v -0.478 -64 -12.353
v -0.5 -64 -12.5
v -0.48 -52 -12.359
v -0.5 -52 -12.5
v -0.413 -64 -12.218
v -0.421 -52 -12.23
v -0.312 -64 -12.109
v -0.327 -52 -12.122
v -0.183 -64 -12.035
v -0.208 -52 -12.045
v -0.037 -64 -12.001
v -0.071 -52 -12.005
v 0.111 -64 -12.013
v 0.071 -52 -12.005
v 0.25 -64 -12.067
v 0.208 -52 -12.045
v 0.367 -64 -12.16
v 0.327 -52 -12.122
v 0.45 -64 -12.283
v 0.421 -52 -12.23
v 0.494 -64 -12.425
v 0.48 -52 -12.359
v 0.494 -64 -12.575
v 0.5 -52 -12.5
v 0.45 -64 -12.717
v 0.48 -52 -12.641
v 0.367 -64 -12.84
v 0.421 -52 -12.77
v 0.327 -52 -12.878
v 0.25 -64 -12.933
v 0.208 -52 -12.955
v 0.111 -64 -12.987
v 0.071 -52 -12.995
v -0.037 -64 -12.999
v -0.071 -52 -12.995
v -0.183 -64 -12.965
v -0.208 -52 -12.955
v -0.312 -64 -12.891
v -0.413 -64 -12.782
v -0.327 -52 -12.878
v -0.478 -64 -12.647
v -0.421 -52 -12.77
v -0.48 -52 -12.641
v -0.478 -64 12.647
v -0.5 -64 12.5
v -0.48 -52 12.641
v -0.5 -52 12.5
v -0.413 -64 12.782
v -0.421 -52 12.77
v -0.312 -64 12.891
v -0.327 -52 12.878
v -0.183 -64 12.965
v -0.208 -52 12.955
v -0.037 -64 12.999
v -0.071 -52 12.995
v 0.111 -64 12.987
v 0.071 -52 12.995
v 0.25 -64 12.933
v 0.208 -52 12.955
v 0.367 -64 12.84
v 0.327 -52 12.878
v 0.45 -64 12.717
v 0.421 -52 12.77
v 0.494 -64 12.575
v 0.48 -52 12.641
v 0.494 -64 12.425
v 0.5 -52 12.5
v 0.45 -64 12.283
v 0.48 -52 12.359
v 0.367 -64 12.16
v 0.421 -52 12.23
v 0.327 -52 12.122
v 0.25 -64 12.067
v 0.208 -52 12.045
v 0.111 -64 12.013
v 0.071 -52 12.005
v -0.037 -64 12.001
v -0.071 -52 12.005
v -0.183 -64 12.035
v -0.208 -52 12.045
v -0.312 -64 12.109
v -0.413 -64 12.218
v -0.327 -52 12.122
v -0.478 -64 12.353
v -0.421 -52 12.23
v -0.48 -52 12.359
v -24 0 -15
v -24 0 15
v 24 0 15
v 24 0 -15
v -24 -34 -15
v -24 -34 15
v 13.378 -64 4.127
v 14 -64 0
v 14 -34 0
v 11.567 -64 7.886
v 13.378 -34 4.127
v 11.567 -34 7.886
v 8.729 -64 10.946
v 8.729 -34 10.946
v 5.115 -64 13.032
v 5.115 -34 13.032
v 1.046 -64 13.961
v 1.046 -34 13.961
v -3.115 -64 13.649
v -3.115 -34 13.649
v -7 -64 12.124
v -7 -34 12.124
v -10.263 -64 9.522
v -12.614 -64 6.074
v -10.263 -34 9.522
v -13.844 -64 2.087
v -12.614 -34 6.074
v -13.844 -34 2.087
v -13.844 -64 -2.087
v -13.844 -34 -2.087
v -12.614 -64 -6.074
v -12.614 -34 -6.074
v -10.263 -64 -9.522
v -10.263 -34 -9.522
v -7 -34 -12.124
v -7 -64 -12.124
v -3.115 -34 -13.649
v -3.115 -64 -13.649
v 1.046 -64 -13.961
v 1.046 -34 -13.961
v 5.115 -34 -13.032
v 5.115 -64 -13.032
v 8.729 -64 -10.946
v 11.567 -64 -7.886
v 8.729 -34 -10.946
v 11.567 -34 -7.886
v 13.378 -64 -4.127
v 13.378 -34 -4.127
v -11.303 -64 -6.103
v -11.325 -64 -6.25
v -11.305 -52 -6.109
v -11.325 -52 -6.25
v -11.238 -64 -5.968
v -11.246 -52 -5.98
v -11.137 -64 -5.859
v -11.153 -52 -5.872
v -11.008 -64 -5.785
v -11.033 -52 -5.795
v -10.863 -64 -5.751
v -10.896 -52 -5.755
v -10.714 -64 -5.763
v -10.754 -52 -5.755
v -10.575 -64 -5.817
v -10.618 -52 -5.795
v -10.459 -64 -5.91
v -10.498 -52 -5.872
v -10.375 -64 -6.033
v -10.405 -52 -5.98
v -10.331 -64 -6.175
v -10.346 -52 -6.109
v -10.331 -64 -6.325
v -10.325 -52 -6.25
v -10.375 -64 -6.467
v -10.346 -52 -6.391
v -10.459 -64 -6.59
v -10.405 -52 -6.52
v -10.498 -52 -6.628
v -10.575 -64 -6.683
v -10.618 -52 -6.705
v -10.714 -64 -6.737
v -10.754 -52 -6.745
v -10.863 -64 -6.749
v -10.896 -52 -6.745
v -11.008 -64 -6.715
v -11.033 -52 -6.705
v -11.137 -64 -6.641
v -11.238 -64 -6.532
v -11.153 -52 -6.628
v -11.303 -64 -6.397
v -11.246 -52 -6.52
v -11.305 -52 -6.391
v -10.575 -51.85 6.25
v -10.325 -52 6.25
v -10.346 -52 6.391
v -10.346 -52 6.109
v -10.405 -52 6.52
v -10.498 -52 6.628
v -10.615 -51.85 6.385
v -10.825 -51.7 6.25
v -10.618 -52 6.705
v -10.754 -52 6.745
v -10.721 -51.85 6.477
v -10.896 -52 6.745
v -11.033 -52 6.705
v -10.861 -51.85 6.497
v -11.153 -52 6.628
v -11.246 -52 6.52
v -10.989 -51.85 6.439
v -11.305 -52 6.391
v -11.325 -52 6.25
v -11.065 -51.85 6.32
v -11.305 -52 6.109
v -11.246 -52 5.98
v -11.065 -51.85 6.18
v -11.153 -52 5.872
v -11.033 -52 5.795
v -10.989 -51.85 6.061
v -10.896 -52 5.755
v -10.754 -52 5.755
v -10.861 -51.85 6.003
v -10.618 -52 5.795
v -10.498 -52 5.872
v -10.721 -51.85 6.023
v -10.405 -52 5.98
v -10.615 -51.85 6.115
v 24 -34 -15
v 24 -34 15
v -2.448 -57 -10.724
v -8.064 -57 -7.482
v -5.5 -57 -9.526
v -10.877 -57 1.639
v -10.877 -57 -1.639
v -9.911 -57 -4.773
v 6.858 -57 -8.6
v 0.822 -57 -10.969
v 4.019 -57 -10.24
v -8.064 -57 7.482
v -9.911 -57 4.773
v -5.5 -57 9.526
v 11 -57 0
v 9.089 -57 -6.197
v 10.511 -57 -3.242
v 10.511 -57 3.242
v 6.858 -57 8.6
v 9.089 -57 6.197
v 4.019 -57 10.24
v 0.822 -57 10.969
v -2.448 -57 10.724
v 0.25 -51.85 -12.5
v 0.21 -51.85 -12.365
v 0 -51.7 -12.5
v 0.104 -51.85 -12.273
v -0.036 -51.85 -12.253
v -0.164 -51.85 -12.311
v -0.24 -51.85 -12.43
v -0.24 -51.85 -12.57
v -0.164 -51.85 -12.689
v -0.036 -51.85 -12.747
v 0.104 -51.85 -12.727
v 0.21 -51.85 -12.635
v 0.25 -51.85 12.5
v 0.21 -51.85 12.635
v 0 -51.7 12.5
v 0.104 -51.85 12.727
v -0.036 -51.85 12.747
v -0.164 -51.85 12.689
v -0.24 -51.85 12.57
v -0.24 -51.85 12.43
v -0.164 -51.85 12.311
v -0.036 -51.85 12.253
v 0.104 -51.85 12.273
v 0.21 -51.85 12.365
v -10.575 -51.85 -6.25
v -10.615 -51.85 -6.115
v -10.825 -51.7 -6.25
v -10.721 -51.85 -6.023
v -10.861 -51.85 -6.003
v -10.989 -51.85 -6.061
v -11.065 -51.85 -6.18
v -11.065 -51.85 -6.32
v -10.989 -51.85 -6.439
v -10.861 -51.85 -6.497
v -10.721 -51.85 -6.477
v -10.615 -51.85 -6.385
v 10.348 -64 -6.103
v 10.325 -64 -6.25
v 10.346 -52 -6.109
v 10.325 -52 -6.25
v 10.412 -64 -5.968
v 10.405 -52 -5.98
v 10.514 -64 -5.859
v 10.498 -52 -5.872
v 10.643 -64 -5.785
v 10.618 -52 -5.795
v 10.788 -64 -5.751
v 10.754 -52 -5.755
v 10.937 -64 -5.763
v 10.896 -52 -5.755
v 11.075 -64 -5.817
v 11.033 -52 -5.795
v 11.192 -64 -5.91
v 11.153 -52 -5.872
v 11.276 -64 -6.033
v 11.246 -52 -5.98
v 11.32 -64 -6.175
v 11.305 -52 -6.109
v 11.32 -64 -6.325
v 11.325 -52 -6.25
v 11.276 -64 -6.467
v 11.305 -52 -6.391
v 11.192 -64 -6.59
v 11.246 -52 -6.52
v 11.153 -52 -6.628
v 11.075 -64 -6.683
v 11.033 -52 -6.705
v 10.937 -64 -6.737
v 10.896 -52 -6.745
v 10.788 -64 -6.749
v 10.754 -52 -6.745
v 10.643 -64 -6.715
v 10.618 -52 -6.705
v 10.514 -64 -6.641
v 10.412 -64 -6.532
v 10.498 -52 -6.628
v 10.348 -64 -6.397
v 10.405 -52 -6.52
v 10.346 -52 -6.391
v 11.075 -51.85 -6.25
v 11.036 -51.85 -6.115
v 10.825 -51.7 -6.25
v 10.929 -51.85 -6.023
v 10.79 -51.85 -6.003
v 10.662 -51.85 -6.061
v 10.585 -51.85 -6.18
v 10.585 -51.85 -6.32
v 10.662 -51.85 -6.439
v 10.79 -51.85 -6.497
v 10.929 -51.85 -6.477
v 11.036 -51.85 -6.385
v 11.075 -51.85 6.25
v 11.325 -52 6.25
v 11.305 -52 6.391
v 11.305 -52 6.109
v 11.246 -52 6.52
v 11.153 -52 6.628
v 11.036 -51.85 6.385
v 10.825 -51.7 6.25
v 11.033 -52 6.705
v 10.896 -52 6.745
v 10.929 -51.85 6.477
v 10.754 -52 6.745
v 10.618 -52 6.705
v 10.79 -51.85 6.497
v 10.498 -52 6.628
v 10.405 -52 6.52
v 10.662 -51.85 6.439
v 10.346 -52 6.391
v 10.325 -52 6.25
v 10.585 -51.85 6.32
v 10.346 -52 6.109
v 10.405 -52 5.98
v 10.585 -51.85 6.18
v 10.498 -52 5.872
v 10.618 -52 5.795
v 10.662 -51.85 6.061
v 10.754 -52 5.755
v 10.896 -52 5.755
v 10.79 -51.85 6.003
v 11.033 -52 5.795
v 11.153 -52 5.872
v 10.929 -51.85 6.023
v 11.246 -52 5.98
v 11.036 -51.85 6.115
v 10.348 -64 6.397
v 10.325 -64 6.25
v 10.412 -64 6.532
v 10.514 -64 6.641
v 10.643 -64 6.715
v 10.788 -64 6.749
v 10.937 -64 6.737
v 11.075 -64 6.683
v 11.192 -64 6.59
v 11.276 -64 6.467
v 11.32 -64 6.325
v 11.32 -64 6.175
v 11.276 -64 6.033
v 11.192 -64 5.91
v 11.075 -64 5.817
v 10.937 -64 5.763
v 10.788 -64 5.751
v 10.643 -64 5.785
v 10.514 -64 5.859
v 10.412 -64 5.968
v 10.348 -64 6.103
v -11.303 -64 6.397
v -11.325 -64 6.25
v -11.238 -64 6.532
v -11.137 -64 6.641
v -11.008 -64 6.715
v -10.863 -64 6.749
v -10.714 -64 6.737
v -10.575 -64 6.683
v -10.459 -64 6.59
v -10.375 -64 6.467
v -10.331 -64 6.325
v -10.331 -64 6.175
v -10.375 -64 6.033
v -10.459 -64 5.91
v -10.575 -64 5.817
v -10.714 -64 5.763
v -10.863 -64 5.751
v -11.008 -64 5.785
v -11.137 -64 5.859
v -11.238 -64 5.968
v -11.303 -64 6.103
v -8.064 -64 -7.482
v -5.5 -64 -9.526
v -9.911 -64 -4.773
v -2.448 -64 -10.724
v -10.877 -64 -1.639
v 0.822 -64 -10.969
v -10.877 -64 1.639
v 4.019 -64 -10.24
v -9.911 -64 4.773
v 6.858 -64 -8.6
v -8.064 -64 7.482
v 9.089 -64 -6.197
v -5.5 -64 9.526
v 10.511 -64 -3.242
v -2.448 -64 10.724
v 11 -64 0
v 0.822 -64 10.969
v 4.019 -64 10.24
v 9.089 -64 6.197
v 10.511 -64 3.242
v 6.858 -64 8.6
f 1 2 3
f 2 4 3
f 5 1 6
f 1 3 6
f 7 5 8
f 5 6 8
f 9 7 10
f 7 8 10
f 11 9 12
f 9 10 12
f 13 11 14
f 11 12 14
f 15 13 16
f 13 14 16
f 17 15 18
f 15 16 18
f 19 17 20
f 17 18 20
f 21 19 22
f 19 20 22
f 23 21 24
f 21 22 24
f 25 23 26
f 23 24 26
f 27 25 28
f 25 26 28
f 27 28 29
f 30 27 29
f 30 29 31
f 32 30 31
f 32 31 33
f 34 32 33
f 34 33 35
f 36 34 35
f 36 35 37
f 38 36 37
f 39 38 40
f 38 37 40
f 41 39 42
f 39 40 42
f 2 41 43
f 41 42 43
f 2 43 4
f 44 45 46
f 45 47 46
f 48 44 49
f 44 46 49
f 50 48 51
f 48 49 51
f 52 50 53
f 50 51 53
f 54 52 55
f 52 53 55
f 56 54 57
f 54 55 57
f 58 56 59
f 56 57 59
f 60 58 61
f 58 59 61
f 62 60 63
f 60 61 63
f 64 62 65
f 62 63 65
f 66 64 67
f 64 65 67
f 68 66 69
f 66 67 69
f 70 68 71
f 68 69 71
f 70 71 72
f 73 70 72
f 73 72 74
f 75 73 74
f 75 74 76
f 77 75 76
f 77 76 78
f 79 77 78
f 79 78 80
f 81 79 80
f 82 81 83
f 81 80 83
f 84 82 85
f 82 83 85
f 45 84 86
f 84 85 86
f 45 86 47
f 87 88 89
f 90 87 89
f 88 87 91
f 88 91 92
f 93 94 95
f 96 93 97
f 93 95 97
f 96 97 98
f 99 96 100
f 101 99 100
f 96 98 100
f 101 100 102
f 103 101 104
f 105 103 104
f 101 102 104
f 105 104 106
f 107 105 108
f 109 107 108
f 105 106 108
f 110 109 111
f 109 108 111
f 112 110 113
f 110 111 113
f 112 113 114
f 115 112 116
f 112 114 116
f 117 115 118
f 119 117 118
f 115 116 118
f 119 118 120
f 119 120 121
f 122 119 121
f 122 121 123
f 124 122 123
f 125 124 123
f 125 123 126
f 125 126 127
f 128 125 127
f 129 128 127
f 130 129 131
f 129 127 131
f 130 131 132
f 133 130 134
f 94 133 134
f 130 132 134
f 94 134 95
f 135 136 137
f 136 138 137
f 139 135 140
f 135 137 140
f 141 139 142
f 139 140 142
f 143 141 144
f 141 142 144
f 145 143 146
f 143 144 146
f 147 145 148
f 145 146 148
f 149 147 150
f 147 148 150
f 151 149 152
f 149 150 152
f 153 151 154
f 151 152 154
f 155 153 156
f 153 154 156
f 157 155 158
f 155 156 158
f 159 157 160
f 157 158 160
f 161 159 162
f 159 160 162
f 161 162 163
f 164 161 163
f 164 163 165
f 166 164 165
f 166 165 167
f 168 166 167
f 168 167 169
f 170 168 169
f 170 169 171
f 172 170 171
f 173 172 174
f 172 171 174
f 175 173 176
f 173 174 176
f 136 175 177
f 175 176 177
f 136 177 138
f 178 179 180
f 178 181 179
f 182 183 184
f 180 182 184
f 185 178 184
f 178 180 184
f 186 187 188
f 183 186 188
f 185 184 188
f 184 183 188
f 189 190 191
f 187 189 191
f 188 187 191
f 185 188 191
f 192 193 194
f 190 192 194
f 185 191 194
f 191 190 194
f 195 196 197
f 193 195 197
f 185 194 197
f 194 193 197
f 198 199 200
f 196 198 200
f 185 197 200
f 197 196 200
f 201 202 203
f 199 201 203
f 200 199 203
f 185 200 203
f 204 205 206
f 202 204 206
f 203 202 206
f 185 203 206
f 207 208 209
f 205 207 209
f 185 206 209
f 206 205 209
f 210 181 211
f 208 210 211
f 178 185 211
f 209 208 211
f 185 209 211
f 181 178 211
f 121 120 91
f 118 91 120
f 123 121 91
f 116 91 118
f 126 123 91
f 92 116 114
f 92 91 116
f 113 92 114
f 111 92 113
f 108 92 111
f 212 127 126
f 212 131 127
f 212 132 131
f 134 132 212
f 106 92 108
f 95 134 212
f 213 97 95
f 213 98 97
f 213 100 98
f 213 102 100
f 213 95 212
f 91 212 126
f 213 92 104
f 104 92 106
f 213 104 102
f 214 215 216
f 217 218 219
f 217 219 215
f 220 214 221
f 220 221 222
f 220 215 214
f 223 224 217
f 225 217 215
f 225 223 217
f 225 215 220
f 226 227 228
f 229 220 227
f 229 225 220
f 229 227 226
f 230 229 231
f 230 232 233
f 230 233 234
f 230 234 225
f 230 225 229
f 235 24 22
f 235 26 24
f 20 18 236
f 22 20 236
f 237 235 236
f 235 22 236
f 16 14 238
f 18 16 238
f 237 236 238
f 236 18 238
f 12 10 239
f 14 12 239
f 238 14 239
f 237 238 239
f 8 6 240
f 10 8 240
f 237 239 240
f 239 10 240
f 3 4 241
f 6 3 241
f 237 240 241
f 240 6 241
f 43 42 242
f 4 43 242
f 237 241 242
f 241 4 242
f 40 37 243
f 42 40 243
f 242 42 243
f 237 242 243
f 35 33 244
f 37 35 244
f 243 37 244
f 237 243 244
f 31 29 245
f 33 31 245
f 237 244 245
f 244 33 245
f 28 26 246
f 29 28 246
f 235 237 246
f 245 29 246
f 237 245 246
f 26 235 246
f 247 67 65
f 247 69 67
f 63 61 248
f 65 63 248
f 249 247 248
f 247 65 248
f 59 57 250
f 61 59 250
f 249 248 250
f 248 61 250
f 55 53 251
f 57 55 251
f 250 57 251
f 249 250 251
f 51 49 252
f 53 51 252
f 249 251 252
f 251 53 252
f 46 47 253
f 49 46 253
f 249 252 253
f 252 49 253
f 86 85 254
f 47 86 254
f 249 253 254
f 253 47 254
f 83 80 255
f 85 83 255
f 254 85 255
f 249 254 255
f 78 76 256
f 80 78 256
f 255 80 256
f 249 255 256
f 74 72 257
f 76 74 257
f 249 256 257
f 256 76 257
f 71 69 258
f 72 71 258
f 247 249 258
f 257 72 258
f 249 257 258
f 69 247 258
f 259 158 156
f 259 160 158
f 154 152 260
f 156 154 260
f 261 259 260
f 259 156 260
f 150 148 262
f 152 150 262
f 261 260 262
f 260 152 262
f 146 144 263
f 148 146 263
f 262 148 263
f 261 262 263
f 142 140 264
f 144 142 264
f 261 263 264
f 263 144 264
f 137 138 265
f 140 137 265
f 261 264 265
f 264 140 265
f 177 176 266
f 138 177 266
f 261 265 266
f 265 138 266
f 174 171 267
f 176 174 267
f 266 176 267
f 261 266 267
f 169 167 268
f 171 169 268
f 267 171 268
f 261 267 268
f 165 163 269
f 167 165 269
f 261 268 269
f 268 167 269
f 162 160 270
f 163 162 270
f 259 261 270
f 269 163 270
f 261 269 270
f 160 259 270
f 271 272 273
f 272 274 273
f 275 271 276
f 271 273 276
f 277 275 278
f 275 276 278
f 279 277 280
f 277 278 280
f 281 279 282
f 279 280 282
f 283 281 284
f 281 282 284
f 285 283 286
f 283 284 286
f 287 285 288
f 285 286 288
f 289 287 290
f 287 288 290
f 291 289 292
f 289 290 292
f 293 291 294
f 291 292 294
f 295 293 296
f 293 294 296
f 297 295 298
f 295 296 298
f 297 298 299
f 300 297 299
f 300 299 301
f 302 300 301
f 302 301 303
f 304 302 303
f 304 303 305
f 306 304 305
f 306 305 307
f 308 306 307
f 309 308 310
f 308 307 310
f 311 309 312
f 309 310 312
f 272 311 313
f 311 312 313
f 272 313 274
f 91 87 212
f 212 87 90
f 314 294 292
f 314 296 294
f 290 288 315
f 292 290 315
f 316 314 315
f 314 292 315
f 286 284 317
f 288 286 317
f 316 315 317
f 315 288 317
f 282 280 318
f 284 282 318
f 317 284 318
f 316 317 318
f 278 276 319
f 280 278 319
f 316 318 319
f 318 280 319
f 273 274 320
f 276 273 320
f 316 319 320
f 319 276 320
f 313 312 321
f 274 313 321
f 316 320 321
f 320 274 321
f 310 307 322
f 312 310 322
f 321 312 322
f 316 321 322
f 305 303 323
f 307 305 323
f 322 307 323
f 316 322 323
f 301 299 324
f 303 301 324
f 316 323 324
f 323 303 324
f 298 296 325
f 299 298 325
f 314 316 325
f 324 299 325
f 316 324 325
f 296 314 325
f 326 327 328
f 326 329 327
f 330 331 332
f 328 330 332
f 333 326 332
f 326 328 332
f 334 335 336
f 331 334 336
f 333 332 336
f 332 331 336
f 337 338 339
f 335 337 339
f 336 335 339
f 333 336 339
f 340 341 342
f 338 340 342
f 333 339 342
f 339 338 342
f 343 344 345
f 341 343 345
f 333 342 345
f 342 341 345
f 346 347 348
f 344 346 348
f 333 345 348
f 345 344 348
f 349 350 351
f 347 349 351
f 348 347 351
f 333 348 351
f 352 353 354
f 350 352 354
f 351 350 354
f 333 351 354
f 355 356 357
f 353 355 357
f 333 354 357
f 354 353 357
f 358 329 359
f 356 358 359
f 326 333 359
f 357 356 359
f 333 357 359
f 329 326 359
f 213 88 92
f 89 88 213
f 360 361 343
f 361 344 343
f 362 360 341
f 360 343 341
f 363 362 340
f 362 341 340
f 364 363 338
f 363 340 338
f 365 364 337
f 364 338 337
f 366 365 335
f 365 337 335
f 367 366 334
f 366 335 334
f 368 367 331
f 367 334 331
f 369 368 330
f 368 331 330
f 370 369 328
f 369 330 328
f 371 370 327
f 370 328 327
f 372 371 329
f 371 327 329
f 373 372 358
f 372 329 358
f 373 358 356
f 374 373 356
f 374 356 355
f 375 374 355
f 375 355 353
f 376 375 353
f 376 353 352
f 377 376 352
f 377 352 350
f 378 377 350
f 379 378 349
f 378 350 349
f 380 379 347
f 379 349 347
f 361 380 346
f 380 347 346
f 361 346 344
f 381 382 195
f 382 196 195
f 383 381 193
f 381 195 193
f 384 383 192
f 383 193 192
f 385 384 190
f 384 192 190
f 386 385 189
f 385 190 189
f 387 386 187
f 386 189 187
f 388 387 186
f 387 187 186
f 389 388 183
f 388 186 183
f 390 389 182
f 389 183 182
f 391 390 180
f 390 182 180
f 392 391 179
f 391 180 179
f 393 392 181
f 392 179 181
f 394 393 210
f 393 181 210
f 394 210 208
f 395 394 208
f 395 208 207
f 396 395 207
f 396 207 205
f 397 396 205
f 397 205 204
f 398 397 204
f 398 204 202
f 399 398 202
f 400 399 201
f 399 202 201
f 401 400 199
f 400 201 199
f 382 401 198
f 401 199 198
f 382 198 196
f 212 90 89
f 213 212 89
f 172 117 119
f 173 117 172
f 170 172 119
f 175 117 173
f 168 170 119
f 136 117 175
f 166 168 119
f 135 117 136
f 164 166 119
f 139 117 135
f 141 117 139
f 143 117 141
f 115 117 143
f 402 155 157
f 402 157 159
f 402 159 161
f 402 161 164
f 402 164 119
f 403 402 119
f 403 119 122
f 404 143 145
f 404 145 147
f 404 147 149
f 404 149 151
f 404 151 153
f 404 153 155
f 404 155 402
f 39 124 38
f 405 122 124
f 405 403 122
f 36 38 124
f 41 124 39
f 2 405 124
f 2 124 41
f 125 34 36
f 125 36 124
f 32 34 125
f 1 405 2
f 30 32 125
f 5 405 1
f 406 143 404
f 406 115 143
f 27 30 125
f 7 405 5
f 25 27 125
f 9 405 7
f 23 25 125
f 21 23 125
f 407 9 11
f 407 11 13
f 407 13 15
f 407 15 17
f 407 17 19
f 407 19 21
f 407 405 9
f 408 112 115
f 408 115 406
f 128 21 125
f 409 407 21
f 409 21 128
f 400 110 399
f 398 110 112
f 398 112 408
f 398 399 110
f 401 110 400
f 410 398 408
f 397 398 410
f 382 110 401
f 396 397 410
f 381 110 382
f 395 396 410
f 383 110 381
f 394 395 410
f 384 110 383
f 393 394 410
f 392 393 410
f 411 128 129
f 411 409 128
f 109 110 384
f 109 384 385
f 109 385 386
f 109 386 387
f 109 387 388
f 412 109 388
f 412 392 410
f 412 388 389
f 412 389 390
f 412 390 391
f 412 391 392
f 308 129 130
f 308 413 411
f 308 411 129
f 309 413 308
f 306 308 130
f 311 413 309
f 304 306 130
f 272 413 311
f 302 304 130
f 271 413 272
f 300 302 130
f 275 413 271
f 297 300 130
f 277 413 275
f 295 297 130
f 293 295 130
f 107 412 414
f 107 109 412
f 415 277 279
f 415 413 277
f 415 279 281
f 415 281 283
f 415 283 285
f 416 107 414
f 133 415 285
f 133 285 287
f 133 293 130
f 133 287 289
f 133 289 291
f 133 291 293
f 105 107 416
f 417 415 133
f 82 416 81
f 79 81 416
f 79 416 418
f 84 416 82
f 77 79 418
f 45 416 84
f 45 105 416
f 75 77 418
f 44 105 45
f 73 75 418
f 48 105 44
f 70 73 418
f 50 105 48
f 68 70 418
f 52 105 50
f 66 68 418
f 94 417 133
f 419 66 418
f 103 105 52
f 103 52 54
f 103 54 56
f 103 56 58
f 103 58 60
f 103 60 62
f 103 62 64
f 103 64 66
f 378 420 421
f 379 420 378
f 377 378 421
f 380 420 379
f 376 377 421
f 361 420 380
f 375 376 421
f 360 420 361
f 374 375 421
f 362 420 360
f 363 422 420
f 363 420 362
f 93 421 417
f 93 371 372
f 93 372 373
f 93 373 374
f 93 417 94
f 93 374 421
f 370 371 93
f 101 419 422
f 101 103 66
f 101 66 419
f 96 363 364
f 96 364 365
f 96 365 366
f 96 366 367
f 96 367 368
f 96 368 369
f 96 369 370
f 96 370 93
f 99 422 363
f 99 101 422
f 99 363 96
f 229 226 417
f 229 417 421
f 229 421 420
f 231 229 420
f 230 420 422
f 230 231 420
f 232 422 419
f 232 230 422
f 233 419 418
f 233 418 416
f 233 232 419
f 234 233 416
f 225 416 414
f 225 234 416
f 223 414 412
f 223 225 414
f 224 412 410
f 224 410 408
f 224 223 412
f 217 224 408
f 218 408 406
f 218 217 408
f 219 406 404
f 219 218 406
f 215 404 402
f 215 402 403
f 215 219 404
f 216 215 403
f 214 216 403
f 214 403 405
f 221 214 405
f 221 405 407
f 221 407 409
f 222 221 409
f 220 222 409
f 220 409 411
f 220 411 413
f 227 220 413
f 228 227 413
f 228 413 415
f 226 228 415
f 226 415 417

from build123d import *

# Parameters (mm, degrees)
F0_W     = 48
F0_H     = 30
F1_DEPTH = 34
F2_R     = 14
F2_R_2   = 11
F3_DEPTH = 30
F4_DEPTH = 23
F6_D     = 1
F6_DEPTH = 12
F6_TIP   = 0.3004303095


with BuildPart() as f1:
    # F0 (on Front) → F1 (new body)
    with BuildSketch(Plane.XZ):
        Rectangle(F0_W, F0_H)
    extrude(amount=F1_DEPTH)

    # F2 (on face) → F3 (join)
    with BuildSketch(Plane.XZ.offset(34)):
        Circle(F2_R)
        Circle(F2_R_2, mode=Mode.SUBTRACT)
    extrude(amount=F3_DEPTH)

    # F4 (add): a face of the model
    f4_faces = [f1.faces().sort_by_distance(p)[0] for p in [
        (0, -34, 0),
    ]]
    extrude(f4_faces, amount=F4_DEPTH)

    # F6
    with Locations(Plane.XZ.offset(64)):
        with Locations((0, 12.5), (-10.8253175473, 6.25), (-10.8253175473, -6.25), (0, -12.5), (10.8253175473, -6.25), (10.8253175473, 6.25)):
            Hole(F6_D / 2, depth=F6_DEPTH)
            with Locations((0, 0, -(F6_DEPTH + F6_TIP / 2))):  # 118° drill point
                Cone(0, F6_D / 2, F6_TIP, mode=Mode.SUBTRACT)


solid = f1.part
